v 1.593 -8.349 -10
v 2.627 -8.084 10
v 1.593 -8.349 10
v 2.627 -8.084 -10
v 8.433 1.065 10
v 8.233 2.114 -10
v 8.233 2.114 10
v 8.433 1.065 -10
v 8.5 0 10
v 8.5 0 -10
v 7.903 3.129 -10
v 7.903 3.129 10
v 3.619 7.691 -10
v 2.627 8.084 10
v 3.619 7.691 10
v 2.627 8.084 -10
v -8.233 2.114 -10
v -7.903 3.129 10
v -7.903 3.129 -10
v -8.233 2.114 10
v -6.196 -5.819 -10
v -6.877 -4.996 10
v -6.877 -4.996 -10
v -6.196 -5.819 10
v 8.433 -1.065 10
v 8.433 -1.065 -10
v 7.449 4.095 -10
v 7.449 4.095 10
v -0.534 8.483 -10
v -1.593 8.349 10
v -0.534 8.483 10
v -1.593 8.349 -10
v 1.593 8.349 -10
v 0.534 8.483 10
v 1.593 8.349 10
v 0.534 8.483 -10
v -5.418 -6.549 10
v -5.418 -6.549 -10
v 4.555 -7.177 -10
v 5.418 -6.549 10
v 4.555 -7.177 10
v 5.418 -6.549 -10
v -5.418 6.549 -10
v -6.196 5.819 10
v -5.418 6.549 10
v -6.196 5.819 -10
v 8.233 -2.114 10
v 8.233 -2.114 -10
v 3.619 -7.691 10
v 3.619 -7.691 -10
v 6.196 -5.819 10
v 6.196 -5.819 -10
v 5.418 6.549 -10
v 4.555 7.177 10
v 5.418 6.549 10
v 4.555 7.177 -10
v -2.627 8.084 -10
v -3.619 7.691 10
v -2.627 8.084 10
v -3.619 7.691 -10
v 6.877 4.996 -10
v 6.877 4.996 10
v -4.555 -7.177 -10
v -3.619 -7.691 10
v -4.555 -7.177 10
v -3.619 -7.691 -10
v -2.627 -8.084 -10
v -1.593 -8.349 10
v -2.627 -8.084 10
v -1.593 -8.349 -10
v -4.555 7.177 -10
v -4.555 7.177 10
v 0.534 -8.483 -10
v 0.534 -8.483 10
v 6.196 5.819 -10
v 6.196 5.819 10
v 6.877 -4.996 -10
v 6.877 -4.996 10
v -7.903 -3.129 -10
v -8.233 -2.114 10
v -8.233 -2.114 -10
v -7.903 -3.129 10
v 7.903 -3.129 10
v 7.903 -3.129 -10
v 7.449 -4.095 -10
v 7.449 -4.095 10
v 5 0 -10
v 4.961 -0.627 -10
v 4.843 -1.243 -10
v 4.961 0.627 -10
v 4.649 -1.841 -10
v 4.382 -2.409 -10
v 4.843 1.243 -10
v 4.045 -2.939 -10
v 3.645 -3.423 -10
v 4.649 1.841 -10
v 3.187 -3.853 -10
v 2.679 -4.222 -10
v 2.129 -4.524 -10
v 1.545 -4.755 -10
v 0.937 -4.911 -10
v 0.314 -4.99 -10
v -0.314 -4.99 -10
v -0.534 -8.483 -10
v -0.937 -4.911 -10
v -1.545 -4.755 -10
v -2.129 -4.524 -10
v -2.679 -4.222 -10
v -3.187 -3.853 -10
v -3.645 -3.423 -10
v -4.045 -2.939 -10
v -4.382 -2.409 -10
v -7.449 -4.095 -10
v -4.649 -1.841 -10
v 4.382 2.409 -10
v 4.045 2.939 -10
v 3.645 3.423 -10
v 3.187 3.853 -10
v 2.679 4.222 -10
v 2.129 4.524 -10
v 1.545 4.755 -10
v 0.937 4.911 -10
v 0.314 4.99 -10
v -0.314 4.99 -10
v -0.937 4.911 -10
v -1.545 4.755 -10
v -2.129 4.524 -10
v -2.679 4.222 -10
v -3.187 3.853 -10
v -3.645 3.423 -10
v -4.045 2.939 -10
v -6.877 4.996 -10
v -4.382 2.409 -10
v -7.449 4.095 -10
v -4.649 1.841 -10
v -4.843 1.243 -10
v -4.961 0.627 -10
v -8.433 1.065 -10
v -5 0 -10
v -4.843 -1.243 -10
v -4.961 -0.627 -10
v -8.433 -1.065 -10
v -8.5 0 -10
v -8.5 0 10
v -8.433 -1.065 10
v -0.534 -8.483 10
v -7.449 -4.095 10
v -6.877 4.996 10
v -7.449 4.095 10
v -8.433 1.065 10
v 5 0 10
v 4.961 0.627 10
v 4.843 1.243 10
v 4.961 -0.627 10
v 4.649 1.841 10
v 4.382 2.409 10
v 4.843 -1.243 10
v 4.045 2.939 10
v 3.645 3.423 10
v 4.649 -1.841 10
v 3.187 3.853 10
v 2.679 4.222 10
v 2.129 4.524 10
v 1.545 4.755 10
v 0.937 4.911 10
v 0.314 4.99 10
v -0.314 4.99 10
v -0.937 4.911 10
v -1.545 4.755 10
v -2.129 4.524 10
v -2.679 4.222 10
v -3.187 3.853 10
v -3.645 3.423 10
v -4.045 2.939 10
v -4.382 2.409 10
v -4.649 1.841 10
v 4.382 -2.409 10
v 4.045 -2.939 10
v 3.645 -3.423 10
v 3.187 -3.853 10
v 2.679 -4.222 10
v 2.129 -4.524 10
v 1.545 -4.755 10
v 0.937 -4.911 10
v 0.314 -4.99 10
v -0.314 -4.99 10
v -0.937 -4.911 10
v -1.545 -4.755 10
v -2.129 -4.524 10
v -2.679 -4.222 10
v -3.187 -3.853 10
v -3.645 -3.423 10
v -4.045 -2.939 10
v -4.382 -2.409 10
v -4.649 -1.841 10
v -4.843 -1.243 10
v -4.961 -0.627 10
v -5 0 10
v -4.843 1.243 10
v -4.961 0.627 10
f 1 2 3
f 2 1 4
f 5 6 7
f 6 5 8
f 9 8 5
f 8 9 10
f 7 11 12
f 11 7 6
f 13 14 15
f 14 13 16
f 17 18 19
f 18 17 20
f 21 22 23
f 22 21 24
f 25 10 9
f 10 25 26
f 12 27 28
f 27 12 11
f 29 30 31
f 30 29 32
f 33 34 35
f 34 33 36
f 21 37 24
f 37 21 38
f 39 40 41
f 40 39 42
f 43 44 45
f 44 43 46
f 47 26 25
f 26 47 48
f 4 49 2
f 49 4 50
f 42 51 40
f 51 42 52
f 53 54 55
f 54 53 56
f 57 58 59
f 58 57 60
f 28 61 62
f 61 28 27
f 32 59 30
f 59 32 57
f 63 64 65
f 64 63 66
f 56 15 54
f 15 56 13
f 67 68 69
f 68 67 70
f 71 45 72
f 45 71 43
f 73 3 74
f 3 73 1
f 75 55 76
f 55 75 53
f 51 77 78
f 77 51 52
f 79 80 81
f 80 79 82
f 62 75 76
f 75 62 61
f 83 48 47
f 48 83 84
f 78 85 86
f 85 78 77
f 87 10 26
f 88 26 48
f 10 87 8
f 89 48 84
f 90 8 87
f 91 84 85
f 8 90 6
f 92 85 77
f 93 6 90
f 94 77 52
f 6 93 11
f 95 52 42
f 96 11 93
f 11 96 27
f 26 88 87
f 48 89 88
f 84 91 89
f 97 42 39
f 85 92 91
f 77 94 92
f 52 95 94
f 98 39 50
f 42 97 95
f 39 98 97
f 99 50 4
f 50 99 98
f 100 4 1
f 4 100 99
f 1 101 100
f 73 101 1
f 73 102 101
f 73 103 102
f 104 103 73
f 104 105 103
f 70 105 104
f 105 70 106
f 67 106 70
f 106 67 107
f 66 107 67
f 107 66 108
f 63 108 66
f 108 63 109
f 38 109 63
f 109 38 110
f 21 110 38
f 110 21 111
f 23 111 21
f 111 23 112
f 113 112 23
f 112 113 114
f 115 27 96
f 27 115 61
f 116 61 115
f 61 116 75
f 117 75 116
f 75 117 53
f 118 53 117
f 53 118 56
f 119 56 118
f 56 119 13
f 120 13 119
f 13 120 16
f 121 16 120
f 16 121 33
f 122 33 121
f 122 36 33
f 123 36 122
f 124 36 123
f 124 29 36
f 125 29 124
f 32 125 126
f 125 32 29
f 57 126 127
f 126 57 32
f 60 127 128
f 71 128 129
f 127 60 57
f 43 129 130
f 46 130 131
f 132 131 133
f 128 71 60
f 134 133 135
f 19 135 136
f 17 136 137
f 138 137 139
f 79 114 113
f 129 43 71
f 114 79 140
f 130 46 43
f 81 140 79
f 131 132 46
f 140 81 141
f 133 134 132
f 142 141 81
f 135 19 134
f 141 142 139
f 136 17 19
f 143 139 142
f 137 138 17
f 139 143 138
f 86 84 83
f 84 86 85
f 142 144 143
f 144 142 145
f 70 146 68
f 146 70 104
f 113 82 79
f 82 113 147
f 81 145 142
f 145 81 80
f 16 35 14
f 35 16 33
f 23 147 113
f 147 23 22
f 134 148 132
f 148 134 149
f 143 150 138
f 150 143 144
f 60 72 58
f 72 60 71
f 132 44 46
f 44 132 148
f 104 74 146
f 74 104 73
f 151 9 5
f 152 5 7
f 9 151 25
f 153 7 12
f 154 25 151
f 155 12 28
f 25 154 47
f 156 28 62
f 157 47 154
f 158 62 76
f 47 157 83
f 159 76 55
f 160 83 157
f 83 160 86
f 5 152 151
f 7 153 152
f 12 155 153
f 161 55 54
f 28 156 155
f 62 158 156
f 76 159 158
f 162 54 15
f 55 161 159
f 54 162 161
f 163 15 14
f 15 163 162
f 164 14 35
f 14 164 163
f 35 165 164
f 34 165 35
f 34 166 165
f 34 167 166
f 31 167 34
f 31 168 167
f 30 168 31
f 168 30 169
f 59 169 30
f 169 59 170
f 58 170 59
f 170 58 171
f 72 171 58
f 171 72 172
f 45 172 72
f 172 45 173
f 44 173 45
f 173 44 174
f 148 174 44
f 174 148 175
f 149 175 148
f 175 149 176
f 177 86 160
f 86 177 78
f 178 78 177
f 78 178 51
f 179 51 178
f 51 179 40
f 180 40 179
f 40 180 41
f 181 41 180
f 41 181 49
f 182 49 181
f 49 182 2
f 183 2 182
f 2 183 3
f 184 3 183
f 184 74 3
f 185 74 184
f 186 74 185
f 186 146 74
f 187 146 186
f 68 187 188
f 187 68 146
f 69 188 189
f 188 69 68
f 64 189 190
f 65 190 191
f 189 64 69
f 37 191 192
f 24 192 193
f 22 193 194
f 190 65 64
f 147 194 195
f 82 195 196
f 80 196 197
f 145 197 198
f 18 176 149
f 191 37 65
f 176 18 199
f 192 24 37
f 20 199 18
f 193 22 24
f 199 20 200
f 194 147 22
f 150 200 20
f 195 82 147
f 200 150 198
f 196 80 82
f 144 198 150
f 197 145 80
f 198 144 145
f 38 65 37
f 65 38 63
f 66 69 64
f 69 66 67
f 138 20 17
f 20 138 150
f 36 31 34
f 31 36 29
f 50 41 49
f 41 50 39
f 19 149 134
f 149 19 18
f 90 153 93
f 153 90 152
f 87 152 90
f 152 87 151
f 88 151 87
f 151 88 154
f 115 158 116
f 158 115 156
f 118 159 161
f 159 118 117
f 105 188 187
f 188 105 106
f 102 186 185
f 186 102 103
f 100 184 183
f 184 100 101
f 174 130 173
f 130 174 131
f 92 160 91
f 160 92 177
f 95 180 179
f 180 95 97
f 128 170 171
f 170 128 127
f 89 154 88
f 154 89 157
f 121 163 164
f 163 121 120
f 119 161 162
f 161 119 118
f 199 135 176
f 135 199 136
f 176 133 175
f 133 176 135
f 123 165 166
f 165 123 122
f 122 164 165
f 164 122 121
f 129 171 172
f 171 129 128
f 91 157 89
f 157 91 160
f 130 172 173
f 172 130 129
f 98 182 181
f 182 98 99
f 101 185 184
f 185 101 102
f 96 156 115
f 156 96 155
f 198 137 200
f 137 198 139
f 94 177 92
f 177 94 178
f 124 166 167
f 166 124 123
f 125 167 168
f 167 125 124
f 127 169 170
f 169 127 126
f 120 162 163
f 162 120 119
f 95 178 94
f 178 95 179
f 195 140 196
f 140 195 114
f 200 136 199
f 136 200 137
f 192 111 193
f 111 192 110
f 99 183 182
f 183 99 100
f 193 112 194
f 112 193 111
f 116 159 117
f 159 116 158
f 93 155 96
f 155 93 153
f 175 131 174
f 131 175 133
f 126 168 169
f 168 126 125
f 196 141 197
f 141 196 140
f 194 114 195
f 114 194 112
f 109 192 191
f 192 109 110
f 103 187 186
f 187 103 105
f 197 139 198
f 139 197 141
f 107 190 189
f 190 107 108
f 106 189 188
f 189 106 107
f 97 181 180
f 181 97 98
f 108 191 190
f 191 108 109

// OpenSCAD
$fn = 50;


difference() {
	union() {
		translate(v = [0, 0, -10.0000000000]) {
			cylinder(h = 20, r = 8.5000000000);
		}
	}
	union() {
		translate(v = [0, 0, -100.0000000000]) {
			cylinder(h = 200, r = 5.0000000000);
		}
	}
}
